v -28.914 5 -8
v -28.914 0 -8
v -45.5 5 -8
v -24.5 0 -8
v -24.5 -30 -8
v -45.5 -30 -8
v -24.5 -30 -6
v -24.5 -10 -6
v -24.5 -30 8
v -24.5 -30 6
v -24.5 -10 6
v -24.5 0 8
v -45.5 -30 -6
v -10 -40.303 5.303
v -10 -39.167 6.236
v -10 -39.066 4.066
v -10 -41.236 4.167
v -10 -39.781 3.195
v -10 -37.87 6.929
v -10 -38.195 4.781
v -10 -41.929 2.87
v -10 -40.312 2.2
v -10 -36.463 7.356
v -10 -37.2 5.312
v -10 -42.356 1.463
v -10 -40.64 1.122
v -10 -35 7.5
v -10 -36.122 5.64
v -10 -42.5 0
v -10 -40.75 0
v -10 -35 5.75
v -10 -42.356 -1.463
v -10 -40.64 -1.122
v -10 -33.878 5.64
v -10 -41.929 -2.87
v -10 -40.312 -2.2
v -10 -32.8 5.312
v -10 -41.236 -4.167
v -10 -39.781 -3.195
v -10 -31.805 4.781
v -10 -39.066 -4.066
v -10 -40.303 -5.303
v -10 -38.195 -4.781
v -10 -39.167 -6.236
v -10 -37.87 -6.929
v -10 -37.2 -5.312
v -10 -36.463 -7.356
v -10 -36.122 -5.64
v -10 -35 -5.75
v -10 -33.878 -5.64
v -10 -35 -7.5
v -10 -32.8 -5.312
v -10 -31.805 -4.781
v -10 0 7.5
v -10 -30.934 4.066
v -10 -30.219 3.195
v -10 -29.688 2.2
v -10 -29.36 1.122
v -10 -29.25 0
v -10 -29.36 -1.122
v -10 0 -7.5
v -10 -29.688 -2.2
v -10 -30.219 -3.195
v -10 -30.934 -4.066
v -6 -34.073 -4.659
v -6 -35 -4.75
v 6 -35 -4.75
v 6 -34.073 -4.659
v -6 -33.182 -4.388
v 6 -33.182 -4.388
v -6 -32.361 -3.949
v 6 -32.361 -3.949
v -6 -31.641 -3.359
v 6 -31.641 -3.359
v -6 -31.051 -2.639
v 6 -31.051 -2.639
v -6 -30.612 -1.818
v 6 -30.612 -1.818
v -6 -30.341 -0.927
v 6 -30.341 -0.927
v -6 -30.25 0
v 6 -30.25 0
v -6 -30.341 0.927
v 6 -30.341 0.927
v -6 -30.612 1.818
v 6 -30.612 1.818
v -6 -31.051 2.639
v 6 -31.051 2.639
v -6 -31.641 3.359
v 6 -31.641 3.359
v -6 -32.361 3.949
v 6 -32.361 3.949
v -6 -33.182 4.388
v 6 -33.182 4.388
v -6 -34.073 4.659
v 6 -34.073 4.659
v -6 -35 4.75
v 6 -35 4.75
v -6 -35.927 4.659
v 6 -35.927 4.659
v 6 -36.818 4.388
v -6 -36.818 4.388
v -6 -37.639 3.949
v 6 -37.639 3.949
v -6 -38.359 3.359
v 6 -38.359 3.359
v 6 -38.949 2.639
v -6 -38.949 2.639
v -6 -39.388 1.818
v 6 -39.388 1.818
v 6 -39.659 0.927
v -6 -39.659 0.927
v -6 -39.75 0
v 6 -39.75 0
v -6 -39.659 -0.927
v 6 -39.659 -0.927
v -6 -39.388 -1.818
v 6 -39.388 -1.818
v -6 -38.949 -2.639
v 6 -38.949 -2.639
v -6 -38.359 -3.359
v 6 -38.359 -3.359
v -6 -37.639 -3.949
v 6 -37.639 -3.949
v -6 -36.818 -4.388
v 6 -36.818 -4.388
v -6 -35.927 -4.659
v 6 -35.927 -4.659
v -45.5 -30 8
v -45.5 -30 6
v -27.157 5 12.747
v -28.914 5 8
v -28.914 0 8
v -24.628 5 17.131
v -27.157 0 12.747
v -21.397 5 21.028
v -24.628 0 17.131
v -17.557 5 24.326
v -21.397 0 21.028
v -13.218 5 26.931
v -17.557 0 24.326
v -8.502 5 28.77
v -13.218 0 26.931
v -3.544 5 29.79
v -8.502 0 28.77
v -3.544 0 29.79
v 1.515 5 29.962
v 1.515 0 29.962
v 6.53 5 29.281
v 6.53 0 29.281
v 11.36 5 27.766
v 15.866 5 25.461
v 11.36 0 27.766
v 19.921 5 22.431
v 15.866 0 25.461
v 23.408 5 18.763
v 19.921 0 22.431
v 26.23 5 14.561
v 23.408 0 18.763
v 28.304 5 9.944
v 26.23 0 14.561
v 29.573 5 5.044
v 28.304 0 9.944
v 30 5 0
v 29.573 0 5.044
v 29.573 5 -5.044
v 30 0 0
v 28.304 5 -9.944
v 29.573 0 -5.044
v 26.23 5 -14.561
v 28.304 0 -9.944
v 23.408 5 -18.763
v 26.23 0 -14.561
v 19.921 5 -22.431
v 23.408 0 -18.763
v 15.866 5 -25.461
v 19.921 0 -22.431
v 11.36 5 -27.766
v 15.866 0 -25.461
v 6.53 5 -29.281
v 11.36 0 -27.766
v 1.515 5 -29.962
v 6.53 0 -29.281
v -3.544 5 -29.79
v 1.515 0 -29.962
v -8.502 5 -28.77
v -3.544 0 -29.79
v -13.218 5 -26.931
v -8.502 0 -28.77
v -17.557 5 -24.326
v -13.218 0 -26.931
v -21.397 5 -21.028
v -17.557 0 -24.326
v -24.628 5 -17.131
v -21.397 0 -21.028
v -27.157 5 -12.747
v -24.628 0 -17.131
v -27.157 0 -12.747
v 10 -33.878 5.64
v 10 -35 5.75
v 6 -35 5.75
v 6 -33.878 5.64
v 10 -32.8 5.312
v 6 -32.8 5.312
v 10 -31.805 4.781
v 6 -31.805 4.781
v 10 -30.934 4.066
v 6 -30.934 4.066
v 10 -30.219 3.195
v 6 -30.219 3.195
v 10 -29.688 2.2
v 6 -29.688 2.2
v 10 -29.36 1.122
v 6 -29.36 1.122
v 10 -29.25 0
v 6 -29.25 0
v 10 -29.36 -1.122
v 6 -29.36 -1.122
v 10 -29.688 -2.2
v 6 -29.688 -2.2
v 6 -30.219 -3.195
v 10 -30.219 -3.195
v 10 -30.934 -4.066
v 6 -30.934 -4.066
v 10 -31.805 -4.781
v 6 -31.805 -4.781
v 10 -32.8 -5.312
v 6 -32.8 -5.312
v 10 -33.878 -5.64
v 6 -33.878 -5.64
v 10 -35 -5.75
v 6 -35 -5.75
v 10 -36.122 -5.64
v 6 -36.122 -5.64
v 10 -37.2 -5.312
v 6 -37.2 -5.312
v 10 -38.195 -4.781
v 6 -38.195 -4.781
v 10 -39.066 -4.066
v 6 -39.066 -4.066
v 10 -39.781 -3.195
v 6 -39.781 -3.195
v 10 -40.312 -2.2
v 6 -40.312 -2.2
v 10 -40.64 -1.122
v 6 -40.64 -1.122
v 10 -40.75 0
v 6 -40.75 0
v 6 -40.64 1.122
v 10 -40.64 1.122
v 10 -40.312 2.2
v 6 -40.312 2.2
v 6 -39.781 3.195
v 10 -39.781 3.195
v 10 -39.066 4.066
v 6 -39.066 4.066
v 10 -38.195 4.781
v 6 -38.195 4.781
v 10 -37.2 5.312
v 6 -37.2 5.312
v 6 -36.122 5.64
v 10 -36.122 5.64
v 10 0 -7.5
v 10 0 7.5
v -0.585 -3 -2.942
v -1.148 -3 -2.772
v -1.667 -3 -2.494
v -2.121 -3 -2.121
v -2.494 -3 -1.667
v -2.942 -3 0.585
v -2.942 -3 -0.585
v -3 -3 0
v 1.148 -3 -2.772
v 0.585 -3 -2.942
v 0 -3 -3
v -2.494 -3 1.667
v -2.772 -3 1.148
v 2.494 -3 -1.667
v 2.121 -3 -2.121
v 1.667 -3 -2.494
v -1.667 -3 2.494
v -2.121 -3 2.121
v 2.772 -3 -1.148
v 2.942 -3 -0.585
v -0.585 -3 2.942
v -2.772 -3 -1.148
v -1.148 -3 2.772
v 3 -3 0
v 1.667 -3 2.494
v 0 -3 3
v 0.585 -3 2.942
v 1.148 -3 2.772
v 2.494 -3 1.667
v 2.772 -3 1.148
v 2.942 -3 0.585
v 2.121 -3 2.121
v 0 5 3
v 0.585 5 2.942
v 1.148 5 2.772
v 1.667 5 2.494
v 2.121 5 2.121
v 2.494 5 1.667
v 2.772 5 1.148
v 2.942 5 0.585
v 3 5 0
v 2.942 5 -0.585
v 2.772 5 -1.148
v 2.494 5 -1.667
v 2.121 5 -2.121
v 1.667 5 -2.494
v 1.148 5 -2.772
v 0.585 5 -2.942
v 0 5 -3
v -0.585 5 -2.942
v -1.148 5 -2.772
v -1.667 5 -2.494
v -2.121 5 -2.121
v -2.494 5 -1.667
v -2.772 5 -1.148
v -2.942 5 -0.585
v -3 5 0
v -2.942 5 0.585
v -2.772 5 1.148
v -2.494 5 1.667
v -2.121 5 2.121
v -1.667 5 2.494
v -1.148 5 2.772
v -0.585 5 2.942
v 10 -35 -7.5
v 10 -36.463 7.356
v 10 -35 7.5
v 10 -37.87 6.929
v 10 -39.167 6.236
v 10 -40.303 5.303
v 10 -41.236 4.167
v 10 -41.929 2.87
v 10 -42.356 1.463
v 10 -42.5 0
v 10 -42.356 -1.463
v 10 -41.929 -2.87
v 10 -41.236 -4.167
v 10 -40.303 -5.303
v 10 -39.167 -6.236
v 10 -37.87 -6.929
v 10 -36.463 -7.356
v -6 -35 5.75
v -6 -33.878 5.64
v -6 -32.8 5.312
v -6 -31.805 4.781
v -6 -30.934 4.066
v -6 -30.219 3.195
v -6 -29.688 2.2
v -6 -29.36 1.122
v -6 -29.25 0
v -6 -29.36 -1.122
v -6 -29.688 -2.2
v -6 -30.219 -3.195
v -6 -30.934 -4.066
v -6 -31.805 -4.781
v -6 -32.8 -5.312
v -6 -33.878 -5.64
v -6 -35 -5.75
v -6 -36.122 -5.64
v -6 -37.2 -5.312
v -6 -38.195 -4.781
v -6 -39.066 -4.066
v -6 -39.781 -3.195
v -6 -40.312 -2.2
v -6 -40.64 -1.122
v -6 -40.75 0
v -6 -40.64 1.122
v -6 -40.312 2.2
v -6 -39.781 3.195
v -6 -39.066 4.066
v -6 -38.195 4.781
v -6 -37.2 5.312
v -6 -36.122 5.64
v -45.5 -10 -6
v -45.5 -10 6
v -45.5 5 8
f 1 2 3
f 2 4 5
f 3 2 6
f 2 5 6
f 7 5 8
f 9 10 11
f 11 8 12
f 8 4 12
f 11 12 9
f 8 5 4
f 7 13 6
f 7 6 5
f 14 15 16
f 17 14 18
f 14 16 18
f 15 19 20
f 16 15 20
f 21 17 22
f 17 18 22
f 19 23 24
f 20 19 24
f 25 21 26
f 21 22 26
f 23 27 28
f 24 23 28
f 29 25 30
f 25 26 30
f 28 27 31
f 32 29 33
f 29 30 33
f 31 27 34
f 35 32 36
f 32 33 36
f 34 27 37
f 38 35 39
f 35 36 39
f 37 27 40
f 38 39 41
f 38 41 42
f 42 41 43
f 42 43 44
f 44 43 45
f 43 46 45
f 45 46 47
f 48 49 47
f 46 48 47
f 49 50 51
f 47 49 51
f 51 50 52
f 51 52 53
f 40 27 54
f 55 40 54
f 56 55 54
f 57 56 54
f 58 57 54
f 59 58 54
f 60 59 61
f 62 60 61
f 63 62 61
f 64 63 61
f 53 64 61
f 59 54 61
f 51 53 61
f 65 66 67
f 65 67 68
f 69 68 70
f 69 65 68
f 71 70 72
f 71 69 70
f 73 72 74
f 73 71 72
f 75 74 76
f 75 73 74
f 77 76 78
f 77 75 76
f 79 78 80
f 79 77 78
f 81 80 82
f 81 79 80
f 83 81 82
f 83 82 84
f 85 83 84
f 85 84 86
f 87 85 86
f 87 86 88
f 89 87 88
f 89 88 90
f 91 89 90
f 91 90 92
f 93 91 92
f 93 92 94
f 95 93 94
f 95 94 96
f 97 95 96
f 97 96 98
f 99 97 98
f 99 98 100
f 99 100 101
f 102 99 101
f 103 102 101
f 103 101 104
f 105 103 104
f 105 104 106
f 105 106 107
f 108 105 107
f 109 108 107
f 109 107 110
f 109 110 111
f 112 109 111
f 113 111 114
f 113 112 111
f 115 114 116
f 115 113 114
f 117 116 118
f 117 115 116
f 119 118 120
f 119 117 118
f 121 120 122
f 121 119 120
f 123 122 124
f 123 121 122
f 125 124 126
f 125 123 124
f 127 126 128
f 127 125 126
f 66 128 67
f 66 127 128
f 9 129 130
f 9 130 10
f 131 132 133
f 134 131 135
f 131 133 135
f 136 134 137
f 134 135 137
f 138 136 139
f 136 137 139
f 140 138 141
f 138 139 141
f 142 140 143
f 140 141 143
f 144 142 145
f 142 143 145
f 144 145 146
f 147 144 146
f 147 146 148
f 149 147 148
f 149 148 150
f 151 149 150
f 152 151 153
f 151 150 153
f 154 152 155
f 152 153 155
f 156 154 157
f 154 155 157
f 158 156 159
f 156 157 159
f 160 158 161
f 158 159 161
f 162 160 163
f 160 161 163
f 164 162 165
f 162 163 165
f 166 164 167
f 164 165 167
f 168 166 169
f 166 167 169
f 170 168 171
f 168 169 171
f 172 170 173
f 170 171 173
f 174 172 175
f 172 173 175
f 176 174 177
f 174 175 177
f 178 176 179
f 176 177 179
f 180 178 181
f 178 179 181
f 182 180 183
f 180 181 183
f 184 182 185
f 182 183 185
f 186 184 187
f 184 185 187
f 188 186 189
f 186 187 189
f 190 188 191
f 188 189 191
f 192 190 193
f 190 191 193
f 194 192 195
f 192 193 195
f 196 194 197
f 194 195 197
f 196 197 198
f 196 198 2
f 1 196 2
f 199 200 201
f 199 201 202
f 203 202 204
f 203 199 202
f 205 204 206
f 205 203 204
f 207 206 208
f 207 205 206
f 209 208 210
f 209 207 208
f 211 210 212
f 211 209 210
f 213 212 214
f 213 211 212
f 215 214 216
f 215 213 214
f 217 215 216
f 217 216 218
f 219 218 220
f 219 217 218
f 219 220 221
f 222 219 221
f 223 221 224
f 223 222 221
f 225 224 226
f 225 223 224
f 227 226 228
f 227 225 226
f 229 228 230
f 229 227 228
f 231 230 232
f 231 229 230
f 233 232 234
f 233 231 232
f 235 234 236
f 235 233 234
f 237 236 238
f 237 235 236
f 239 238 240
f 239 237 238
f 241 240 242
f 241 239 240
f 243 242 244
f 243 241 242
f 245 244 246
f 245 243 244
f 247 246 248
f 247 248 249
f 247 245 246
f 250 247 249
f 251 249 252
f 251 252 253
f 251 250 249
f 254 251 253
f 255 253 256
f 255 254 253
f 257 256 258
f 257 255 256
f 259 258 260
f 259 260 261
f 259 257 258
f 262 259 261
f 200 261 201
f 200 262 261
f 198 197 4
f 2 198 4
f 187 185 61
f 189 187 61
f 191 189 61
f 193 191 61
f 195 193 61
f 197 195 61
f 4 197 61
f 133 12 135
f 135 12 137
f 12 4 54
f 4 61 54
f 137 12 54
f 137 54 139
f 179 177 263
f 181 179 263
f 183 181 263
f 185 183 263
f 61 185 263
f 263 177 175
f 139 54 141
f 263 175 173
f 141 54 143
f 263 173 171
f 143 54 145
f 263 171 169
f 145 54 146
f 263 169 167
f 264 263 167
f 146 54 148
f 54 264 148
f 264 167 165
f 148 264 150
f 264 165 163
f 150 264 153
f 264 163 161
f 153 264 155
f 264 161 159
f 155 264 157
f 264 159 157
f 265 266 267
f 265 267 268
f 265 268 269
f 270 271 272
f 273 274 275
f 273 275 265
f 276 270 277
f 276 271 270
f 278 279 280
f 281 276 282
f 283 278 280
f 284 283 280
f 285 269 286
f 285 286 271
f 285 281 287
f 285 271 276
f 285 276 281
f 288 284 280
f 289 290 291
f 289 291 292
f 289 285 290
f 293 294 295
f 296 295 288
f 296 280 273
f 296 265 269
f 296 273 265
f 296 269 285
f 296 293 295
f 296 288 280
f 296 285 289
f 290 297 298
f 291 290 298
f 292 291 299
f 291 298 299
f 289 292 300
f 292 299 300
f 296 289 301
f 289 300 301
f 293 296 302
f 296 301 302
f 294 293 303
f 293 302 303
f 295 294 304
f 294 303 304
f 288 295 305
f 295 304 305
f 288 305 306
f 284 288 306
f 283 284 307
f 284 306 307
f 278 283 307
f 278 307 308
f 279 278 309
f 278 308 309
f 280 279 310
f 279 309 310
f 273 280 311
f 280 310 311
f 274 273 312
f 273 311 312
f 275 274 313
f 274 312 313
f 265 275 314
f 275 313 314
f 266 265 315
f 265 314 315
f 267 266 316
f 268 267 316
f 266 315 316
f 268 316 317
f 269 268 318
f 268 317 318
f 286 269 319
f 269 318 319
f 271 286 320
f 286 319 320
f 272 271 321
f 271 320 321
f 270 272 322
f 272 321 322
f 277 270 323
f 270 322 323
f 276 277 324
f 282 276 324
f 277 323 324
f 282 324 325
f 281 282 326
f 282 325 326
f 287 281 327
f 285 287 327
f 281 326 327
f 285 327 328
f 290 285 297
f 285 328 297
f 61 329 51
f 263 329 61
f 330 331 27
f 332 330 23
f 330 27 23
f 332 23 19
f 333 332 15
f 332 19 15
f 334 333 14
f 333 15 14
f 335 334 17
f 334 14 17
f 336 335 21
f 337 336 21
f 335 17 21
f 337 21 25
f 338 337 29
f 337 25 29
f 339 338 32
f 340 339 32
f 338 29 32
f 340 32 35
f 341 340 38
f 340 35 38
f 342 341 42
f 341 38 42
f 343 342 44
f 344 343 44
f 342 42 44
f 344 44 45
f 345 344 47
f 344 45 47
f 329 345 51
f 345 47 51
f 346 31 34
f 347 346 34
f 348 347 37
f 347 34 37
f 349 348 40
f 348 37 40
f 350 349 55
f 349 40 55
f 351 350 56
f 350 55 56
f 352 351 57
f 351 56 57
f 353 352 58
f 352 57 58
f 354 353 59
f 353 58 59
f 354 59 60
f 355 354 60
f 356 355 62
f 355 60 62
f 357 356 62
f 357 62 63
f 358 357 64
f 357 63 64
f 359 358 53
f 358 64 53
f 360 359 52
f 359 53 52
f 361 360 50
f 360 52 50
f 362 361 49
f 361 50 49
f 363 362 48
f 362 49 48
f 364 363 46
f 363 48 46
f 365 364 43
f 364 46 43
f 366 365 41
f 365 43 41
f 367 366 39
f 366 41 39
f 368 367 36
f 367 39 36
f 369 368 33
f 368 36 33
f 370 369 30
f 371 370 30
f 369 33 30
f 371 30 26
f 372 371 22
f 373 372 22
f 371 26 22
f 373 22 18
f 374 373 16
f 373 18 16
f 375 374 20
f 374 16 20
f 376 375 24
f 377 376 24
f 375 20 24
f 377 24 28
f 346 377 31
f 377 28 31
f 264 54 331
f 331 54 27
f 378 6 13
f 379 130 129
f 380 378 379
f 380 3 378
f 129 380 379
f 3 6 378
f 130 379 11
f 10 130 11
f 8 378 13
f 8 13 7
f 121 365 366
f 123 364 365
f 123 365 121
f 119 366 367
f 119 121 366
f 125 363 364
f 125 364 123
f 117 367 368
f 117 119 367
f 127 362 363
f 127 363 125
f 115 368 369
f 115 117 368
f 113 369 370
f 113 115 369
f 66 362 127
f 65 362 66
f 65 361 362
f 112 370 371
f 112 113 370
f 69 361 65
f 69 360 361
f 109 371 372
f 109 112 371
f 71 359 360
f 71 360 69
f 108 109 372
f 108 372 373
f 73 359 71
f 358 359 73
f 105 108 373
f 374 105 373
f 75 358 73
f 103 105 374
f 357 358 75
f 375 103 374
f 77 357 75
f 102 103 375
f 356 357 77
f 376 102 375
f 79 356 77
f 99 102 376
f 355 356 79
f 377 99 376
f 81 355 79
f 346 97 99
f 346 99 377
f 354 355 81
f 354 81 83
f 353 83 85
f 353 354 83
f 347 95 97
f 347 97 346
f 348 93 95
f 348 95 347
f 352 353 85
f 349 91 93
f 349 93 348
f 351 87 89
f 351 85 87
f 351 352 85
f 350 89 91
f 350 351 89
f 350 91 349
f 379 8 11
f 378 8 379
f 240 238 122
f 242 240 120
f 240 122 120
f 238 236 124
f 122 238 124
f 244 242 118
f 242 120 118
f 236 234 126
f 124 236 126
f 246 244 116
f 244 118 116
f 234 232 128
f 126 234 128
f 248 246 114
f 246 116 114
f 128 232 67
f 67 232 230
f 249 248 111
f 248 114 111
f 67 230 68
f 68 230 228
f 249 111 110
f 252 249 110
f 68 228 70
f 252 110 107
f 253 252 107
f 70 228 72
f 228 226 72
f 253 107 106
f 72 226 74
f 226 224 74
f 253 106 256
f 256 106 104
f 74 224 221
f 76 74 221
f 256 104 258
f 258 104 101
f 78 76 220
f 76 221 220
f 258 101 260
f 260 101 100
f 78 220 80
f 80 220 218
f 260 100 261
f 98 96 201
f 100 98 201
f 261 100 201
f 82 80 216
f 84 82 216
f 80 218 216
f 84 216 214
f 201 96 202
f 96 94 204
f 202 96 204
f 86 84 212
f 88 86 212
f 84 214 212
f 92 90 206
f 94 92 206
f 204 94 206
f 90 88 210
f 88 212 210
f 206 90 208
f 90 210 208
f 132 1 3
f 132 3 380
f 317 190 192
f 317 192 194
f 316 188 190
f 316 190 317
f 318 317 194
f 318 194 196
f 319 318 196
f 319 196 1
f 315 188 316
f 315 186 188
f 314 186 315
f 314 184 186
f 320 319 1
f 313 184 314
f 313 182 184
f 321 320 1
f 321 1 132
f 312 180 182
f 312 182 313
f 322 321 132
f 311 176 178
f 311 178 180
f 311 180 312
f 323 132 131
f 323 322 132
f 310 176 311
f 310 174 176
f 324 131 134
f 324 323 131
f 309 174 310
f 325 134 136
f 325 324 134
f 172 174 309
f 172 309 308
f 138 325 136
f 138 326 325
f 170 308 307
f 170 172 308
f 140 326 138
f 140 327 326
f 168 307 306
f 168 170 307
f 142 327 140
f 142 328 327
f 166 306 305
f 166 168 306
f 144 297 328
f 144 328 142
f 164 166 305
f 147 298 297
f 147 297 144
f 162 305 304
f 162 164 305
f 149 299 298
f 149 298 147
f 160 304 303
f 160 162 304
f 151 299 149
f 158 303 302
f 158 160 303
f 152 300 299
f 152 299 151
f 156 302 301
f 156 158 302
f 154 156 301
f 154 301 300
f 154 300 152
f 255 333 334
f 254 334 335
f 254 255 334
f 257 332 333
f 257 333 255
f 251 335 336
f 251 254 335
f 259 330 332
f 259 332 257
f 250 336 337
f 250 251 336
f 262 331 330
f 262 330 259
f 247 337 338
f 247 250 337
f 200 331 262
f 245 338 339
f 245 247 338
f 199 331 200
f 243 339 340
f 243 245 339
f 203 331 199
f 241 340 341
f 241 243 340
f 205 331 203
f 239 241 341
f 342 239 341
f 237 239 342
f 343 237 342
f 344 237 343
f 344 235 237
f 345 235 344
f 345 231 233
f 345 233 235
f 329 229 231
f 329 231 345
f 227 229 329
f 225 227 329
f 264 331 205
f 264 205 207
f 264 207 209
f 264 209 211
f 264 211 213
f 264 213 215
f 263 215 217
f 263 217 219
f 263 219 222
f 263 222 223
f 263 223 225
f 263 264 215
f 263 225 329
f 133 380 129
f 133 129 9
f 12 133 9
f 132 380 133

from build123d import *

# Parameters (mm, degrees)
SKETCH1_R                       = 30
BOSS_EXTRUDE1_DEPTH             = 5
SKETCH8_R                       = 4.75
BOSS_EXTRUDE3_DEPTH             = 10
SKETCH9_R                       = 5.75
CUT_EXTRUDE3_DEPTH              = 4
SKETCH16_W                      = 21
SKETCH16_H                      = 16
BOSS_EXTRUDE7_DEPTH             = 10
BOSS_EXTRUDE7_DIRECTION_2_REACH = 62.052
SKETCH17_W                      = 21
SKETCH17_H                      = 2
BOSS_EXTRUDE8_DEPTH             = 20
SKETCH18_R                      = 3
CUT_EXTRUDE4_DEPTH              = 8


with BuildPart() as part:
    # Sketch1 → Boss-Extrude1 (new body)
    with BuildSketch(Plane(origin=(0, 0, 0), x_dir=(1, 0, 0), z_dir=(0, 1, 0))):
        with Locations(Location((0, 0, 0), (0, 0, 270))):
            Circle(SKETCH1_R)
    extrude(amount=BOSS_EXTRUDE1_DEPTH)

    # Sketch8 → Boss-Extrude3 (add)
    with BuildSketch(Plane(origin=(10, 0, 0), x_dir=(0, 0, -1), z_dir=(1, 0, 0))):
        with BuildLine():
            Line((-7.5, 0), (-7.5, -35))
            ThreePointArc((-7.5, -35), (0, -42.5), (7.5, -35))
            Line((7.5, -35), (7.5, 0))
            Line((7.5, 0), (-7.5, 0))
        make_face()
        with Locations((0, -35)):
            Circle(SKETCH8_R, mode=Mode.SUBTRACT)
    boss_extrude3 = extrude(amount=-BOSS_EXTRUDE3_DEPTH)

    # Sketch9 → Cut-Extrude3 (cut)
    with BuildSketch(Plane.ZY.offset(-10)):
        with Locations((0, -35)):
            Circle(SKETCH9_R)
    cut_extrude3 = extrude(amount=CUT_EXTRUDE3_DEPTH, mode=Mode.SUBTRACT)

    # Mirror1: Boss-Extrude3, Cut-Extrude3 across plane
    add(boss_extrude3.mirror(Plane(origin=(0, 0, 0), x_dir=(0, 0, 1), z_dir=(1, 0, 0))))
    add(cut_extrude3.mirror(Plane(origin=(0, 0, 0), x_dir=(0, 0, 1), z_dir=(1, 0, 0))), mode=Mode.SUBTRACT)

    # Sketch16 → Boss-Extrude7 (add)
    with BuildSketch(Plane(origin=(0, 0, 0), x_dir=(-1, 0, 0), z_dir=(0, -1, 0))):
        with Locations((35, 0)):
            Rectangle(SKETCH16_W, SKETCH16_H)
    extrude(amount=BOSS_EXTRUDE7_DEPTH)

    # Boss-Extrude7 direction 2: up to this face of the body (flat: up to its plane)
    boss_extrude7_direction_2_end = Plane(part.part.faces().sort_by_distance((0, 5, 0))[0])
    # Sketch16 → Boss-Extrude7 direction 2 (add, up to the picked face)
    with BuildSketch(Plane(origin=(0, 0, 0), x_dir=(-1, 0, 0), z_dir=(0, -1, 0)), mode=Mode.PRIVATE) as boss_extrude7_direction_2_sk1:
        with Locations((35, 0)):
            Rectangle(SKETCH16_W, SKETCH16_H)
    boss_extrude7_direction_2_tool1 = split(extrude(boss_extrude7_direction_2_sk1.sketch, amount=-BOSS_EXTRUDE7_DIRECTION_2_REACH, mode=Mode.PRIVATE), bisect_by=boss_extrude7_direction_2_end, keep=Keep.BOTH, mode=Mode.PRIVATE)
    add(boss_extrude7_direction_2_tool1.solids().sort_by(Axis((-35, 0, 0), (0, 1, 0)))[0])

    # Sketch17 → Boss-Extrude8 (add)
    with BuildSketch(Plane.XZ.offset(10)):
        with Locations((-35, 7)):
            Rectangle(SKETCH17_W, SKETCH17_H)
        with Locations((-35, -7)):
            Rectangle(SKETCH17_W, SKETCH17_H)
    extrude(amount=BOSS_EXTRUDE8_DEPTH)

    # Sketch18 → Cut-Extrude4 (cut)
    with BuildSketch(Plane(origin=(0, 5, 0), x_dir=(1, 0, 0), z_dir=(0, 1, 0))):
        with Locations(Location((0, 0, 0), (0, 0, 270))):
            Circle(SKETCH18_R)
    extrude(amount=-CUT_EXTRUDE4_DEPTH, mode=Mode.SUBTRACT)


solid = part.part
